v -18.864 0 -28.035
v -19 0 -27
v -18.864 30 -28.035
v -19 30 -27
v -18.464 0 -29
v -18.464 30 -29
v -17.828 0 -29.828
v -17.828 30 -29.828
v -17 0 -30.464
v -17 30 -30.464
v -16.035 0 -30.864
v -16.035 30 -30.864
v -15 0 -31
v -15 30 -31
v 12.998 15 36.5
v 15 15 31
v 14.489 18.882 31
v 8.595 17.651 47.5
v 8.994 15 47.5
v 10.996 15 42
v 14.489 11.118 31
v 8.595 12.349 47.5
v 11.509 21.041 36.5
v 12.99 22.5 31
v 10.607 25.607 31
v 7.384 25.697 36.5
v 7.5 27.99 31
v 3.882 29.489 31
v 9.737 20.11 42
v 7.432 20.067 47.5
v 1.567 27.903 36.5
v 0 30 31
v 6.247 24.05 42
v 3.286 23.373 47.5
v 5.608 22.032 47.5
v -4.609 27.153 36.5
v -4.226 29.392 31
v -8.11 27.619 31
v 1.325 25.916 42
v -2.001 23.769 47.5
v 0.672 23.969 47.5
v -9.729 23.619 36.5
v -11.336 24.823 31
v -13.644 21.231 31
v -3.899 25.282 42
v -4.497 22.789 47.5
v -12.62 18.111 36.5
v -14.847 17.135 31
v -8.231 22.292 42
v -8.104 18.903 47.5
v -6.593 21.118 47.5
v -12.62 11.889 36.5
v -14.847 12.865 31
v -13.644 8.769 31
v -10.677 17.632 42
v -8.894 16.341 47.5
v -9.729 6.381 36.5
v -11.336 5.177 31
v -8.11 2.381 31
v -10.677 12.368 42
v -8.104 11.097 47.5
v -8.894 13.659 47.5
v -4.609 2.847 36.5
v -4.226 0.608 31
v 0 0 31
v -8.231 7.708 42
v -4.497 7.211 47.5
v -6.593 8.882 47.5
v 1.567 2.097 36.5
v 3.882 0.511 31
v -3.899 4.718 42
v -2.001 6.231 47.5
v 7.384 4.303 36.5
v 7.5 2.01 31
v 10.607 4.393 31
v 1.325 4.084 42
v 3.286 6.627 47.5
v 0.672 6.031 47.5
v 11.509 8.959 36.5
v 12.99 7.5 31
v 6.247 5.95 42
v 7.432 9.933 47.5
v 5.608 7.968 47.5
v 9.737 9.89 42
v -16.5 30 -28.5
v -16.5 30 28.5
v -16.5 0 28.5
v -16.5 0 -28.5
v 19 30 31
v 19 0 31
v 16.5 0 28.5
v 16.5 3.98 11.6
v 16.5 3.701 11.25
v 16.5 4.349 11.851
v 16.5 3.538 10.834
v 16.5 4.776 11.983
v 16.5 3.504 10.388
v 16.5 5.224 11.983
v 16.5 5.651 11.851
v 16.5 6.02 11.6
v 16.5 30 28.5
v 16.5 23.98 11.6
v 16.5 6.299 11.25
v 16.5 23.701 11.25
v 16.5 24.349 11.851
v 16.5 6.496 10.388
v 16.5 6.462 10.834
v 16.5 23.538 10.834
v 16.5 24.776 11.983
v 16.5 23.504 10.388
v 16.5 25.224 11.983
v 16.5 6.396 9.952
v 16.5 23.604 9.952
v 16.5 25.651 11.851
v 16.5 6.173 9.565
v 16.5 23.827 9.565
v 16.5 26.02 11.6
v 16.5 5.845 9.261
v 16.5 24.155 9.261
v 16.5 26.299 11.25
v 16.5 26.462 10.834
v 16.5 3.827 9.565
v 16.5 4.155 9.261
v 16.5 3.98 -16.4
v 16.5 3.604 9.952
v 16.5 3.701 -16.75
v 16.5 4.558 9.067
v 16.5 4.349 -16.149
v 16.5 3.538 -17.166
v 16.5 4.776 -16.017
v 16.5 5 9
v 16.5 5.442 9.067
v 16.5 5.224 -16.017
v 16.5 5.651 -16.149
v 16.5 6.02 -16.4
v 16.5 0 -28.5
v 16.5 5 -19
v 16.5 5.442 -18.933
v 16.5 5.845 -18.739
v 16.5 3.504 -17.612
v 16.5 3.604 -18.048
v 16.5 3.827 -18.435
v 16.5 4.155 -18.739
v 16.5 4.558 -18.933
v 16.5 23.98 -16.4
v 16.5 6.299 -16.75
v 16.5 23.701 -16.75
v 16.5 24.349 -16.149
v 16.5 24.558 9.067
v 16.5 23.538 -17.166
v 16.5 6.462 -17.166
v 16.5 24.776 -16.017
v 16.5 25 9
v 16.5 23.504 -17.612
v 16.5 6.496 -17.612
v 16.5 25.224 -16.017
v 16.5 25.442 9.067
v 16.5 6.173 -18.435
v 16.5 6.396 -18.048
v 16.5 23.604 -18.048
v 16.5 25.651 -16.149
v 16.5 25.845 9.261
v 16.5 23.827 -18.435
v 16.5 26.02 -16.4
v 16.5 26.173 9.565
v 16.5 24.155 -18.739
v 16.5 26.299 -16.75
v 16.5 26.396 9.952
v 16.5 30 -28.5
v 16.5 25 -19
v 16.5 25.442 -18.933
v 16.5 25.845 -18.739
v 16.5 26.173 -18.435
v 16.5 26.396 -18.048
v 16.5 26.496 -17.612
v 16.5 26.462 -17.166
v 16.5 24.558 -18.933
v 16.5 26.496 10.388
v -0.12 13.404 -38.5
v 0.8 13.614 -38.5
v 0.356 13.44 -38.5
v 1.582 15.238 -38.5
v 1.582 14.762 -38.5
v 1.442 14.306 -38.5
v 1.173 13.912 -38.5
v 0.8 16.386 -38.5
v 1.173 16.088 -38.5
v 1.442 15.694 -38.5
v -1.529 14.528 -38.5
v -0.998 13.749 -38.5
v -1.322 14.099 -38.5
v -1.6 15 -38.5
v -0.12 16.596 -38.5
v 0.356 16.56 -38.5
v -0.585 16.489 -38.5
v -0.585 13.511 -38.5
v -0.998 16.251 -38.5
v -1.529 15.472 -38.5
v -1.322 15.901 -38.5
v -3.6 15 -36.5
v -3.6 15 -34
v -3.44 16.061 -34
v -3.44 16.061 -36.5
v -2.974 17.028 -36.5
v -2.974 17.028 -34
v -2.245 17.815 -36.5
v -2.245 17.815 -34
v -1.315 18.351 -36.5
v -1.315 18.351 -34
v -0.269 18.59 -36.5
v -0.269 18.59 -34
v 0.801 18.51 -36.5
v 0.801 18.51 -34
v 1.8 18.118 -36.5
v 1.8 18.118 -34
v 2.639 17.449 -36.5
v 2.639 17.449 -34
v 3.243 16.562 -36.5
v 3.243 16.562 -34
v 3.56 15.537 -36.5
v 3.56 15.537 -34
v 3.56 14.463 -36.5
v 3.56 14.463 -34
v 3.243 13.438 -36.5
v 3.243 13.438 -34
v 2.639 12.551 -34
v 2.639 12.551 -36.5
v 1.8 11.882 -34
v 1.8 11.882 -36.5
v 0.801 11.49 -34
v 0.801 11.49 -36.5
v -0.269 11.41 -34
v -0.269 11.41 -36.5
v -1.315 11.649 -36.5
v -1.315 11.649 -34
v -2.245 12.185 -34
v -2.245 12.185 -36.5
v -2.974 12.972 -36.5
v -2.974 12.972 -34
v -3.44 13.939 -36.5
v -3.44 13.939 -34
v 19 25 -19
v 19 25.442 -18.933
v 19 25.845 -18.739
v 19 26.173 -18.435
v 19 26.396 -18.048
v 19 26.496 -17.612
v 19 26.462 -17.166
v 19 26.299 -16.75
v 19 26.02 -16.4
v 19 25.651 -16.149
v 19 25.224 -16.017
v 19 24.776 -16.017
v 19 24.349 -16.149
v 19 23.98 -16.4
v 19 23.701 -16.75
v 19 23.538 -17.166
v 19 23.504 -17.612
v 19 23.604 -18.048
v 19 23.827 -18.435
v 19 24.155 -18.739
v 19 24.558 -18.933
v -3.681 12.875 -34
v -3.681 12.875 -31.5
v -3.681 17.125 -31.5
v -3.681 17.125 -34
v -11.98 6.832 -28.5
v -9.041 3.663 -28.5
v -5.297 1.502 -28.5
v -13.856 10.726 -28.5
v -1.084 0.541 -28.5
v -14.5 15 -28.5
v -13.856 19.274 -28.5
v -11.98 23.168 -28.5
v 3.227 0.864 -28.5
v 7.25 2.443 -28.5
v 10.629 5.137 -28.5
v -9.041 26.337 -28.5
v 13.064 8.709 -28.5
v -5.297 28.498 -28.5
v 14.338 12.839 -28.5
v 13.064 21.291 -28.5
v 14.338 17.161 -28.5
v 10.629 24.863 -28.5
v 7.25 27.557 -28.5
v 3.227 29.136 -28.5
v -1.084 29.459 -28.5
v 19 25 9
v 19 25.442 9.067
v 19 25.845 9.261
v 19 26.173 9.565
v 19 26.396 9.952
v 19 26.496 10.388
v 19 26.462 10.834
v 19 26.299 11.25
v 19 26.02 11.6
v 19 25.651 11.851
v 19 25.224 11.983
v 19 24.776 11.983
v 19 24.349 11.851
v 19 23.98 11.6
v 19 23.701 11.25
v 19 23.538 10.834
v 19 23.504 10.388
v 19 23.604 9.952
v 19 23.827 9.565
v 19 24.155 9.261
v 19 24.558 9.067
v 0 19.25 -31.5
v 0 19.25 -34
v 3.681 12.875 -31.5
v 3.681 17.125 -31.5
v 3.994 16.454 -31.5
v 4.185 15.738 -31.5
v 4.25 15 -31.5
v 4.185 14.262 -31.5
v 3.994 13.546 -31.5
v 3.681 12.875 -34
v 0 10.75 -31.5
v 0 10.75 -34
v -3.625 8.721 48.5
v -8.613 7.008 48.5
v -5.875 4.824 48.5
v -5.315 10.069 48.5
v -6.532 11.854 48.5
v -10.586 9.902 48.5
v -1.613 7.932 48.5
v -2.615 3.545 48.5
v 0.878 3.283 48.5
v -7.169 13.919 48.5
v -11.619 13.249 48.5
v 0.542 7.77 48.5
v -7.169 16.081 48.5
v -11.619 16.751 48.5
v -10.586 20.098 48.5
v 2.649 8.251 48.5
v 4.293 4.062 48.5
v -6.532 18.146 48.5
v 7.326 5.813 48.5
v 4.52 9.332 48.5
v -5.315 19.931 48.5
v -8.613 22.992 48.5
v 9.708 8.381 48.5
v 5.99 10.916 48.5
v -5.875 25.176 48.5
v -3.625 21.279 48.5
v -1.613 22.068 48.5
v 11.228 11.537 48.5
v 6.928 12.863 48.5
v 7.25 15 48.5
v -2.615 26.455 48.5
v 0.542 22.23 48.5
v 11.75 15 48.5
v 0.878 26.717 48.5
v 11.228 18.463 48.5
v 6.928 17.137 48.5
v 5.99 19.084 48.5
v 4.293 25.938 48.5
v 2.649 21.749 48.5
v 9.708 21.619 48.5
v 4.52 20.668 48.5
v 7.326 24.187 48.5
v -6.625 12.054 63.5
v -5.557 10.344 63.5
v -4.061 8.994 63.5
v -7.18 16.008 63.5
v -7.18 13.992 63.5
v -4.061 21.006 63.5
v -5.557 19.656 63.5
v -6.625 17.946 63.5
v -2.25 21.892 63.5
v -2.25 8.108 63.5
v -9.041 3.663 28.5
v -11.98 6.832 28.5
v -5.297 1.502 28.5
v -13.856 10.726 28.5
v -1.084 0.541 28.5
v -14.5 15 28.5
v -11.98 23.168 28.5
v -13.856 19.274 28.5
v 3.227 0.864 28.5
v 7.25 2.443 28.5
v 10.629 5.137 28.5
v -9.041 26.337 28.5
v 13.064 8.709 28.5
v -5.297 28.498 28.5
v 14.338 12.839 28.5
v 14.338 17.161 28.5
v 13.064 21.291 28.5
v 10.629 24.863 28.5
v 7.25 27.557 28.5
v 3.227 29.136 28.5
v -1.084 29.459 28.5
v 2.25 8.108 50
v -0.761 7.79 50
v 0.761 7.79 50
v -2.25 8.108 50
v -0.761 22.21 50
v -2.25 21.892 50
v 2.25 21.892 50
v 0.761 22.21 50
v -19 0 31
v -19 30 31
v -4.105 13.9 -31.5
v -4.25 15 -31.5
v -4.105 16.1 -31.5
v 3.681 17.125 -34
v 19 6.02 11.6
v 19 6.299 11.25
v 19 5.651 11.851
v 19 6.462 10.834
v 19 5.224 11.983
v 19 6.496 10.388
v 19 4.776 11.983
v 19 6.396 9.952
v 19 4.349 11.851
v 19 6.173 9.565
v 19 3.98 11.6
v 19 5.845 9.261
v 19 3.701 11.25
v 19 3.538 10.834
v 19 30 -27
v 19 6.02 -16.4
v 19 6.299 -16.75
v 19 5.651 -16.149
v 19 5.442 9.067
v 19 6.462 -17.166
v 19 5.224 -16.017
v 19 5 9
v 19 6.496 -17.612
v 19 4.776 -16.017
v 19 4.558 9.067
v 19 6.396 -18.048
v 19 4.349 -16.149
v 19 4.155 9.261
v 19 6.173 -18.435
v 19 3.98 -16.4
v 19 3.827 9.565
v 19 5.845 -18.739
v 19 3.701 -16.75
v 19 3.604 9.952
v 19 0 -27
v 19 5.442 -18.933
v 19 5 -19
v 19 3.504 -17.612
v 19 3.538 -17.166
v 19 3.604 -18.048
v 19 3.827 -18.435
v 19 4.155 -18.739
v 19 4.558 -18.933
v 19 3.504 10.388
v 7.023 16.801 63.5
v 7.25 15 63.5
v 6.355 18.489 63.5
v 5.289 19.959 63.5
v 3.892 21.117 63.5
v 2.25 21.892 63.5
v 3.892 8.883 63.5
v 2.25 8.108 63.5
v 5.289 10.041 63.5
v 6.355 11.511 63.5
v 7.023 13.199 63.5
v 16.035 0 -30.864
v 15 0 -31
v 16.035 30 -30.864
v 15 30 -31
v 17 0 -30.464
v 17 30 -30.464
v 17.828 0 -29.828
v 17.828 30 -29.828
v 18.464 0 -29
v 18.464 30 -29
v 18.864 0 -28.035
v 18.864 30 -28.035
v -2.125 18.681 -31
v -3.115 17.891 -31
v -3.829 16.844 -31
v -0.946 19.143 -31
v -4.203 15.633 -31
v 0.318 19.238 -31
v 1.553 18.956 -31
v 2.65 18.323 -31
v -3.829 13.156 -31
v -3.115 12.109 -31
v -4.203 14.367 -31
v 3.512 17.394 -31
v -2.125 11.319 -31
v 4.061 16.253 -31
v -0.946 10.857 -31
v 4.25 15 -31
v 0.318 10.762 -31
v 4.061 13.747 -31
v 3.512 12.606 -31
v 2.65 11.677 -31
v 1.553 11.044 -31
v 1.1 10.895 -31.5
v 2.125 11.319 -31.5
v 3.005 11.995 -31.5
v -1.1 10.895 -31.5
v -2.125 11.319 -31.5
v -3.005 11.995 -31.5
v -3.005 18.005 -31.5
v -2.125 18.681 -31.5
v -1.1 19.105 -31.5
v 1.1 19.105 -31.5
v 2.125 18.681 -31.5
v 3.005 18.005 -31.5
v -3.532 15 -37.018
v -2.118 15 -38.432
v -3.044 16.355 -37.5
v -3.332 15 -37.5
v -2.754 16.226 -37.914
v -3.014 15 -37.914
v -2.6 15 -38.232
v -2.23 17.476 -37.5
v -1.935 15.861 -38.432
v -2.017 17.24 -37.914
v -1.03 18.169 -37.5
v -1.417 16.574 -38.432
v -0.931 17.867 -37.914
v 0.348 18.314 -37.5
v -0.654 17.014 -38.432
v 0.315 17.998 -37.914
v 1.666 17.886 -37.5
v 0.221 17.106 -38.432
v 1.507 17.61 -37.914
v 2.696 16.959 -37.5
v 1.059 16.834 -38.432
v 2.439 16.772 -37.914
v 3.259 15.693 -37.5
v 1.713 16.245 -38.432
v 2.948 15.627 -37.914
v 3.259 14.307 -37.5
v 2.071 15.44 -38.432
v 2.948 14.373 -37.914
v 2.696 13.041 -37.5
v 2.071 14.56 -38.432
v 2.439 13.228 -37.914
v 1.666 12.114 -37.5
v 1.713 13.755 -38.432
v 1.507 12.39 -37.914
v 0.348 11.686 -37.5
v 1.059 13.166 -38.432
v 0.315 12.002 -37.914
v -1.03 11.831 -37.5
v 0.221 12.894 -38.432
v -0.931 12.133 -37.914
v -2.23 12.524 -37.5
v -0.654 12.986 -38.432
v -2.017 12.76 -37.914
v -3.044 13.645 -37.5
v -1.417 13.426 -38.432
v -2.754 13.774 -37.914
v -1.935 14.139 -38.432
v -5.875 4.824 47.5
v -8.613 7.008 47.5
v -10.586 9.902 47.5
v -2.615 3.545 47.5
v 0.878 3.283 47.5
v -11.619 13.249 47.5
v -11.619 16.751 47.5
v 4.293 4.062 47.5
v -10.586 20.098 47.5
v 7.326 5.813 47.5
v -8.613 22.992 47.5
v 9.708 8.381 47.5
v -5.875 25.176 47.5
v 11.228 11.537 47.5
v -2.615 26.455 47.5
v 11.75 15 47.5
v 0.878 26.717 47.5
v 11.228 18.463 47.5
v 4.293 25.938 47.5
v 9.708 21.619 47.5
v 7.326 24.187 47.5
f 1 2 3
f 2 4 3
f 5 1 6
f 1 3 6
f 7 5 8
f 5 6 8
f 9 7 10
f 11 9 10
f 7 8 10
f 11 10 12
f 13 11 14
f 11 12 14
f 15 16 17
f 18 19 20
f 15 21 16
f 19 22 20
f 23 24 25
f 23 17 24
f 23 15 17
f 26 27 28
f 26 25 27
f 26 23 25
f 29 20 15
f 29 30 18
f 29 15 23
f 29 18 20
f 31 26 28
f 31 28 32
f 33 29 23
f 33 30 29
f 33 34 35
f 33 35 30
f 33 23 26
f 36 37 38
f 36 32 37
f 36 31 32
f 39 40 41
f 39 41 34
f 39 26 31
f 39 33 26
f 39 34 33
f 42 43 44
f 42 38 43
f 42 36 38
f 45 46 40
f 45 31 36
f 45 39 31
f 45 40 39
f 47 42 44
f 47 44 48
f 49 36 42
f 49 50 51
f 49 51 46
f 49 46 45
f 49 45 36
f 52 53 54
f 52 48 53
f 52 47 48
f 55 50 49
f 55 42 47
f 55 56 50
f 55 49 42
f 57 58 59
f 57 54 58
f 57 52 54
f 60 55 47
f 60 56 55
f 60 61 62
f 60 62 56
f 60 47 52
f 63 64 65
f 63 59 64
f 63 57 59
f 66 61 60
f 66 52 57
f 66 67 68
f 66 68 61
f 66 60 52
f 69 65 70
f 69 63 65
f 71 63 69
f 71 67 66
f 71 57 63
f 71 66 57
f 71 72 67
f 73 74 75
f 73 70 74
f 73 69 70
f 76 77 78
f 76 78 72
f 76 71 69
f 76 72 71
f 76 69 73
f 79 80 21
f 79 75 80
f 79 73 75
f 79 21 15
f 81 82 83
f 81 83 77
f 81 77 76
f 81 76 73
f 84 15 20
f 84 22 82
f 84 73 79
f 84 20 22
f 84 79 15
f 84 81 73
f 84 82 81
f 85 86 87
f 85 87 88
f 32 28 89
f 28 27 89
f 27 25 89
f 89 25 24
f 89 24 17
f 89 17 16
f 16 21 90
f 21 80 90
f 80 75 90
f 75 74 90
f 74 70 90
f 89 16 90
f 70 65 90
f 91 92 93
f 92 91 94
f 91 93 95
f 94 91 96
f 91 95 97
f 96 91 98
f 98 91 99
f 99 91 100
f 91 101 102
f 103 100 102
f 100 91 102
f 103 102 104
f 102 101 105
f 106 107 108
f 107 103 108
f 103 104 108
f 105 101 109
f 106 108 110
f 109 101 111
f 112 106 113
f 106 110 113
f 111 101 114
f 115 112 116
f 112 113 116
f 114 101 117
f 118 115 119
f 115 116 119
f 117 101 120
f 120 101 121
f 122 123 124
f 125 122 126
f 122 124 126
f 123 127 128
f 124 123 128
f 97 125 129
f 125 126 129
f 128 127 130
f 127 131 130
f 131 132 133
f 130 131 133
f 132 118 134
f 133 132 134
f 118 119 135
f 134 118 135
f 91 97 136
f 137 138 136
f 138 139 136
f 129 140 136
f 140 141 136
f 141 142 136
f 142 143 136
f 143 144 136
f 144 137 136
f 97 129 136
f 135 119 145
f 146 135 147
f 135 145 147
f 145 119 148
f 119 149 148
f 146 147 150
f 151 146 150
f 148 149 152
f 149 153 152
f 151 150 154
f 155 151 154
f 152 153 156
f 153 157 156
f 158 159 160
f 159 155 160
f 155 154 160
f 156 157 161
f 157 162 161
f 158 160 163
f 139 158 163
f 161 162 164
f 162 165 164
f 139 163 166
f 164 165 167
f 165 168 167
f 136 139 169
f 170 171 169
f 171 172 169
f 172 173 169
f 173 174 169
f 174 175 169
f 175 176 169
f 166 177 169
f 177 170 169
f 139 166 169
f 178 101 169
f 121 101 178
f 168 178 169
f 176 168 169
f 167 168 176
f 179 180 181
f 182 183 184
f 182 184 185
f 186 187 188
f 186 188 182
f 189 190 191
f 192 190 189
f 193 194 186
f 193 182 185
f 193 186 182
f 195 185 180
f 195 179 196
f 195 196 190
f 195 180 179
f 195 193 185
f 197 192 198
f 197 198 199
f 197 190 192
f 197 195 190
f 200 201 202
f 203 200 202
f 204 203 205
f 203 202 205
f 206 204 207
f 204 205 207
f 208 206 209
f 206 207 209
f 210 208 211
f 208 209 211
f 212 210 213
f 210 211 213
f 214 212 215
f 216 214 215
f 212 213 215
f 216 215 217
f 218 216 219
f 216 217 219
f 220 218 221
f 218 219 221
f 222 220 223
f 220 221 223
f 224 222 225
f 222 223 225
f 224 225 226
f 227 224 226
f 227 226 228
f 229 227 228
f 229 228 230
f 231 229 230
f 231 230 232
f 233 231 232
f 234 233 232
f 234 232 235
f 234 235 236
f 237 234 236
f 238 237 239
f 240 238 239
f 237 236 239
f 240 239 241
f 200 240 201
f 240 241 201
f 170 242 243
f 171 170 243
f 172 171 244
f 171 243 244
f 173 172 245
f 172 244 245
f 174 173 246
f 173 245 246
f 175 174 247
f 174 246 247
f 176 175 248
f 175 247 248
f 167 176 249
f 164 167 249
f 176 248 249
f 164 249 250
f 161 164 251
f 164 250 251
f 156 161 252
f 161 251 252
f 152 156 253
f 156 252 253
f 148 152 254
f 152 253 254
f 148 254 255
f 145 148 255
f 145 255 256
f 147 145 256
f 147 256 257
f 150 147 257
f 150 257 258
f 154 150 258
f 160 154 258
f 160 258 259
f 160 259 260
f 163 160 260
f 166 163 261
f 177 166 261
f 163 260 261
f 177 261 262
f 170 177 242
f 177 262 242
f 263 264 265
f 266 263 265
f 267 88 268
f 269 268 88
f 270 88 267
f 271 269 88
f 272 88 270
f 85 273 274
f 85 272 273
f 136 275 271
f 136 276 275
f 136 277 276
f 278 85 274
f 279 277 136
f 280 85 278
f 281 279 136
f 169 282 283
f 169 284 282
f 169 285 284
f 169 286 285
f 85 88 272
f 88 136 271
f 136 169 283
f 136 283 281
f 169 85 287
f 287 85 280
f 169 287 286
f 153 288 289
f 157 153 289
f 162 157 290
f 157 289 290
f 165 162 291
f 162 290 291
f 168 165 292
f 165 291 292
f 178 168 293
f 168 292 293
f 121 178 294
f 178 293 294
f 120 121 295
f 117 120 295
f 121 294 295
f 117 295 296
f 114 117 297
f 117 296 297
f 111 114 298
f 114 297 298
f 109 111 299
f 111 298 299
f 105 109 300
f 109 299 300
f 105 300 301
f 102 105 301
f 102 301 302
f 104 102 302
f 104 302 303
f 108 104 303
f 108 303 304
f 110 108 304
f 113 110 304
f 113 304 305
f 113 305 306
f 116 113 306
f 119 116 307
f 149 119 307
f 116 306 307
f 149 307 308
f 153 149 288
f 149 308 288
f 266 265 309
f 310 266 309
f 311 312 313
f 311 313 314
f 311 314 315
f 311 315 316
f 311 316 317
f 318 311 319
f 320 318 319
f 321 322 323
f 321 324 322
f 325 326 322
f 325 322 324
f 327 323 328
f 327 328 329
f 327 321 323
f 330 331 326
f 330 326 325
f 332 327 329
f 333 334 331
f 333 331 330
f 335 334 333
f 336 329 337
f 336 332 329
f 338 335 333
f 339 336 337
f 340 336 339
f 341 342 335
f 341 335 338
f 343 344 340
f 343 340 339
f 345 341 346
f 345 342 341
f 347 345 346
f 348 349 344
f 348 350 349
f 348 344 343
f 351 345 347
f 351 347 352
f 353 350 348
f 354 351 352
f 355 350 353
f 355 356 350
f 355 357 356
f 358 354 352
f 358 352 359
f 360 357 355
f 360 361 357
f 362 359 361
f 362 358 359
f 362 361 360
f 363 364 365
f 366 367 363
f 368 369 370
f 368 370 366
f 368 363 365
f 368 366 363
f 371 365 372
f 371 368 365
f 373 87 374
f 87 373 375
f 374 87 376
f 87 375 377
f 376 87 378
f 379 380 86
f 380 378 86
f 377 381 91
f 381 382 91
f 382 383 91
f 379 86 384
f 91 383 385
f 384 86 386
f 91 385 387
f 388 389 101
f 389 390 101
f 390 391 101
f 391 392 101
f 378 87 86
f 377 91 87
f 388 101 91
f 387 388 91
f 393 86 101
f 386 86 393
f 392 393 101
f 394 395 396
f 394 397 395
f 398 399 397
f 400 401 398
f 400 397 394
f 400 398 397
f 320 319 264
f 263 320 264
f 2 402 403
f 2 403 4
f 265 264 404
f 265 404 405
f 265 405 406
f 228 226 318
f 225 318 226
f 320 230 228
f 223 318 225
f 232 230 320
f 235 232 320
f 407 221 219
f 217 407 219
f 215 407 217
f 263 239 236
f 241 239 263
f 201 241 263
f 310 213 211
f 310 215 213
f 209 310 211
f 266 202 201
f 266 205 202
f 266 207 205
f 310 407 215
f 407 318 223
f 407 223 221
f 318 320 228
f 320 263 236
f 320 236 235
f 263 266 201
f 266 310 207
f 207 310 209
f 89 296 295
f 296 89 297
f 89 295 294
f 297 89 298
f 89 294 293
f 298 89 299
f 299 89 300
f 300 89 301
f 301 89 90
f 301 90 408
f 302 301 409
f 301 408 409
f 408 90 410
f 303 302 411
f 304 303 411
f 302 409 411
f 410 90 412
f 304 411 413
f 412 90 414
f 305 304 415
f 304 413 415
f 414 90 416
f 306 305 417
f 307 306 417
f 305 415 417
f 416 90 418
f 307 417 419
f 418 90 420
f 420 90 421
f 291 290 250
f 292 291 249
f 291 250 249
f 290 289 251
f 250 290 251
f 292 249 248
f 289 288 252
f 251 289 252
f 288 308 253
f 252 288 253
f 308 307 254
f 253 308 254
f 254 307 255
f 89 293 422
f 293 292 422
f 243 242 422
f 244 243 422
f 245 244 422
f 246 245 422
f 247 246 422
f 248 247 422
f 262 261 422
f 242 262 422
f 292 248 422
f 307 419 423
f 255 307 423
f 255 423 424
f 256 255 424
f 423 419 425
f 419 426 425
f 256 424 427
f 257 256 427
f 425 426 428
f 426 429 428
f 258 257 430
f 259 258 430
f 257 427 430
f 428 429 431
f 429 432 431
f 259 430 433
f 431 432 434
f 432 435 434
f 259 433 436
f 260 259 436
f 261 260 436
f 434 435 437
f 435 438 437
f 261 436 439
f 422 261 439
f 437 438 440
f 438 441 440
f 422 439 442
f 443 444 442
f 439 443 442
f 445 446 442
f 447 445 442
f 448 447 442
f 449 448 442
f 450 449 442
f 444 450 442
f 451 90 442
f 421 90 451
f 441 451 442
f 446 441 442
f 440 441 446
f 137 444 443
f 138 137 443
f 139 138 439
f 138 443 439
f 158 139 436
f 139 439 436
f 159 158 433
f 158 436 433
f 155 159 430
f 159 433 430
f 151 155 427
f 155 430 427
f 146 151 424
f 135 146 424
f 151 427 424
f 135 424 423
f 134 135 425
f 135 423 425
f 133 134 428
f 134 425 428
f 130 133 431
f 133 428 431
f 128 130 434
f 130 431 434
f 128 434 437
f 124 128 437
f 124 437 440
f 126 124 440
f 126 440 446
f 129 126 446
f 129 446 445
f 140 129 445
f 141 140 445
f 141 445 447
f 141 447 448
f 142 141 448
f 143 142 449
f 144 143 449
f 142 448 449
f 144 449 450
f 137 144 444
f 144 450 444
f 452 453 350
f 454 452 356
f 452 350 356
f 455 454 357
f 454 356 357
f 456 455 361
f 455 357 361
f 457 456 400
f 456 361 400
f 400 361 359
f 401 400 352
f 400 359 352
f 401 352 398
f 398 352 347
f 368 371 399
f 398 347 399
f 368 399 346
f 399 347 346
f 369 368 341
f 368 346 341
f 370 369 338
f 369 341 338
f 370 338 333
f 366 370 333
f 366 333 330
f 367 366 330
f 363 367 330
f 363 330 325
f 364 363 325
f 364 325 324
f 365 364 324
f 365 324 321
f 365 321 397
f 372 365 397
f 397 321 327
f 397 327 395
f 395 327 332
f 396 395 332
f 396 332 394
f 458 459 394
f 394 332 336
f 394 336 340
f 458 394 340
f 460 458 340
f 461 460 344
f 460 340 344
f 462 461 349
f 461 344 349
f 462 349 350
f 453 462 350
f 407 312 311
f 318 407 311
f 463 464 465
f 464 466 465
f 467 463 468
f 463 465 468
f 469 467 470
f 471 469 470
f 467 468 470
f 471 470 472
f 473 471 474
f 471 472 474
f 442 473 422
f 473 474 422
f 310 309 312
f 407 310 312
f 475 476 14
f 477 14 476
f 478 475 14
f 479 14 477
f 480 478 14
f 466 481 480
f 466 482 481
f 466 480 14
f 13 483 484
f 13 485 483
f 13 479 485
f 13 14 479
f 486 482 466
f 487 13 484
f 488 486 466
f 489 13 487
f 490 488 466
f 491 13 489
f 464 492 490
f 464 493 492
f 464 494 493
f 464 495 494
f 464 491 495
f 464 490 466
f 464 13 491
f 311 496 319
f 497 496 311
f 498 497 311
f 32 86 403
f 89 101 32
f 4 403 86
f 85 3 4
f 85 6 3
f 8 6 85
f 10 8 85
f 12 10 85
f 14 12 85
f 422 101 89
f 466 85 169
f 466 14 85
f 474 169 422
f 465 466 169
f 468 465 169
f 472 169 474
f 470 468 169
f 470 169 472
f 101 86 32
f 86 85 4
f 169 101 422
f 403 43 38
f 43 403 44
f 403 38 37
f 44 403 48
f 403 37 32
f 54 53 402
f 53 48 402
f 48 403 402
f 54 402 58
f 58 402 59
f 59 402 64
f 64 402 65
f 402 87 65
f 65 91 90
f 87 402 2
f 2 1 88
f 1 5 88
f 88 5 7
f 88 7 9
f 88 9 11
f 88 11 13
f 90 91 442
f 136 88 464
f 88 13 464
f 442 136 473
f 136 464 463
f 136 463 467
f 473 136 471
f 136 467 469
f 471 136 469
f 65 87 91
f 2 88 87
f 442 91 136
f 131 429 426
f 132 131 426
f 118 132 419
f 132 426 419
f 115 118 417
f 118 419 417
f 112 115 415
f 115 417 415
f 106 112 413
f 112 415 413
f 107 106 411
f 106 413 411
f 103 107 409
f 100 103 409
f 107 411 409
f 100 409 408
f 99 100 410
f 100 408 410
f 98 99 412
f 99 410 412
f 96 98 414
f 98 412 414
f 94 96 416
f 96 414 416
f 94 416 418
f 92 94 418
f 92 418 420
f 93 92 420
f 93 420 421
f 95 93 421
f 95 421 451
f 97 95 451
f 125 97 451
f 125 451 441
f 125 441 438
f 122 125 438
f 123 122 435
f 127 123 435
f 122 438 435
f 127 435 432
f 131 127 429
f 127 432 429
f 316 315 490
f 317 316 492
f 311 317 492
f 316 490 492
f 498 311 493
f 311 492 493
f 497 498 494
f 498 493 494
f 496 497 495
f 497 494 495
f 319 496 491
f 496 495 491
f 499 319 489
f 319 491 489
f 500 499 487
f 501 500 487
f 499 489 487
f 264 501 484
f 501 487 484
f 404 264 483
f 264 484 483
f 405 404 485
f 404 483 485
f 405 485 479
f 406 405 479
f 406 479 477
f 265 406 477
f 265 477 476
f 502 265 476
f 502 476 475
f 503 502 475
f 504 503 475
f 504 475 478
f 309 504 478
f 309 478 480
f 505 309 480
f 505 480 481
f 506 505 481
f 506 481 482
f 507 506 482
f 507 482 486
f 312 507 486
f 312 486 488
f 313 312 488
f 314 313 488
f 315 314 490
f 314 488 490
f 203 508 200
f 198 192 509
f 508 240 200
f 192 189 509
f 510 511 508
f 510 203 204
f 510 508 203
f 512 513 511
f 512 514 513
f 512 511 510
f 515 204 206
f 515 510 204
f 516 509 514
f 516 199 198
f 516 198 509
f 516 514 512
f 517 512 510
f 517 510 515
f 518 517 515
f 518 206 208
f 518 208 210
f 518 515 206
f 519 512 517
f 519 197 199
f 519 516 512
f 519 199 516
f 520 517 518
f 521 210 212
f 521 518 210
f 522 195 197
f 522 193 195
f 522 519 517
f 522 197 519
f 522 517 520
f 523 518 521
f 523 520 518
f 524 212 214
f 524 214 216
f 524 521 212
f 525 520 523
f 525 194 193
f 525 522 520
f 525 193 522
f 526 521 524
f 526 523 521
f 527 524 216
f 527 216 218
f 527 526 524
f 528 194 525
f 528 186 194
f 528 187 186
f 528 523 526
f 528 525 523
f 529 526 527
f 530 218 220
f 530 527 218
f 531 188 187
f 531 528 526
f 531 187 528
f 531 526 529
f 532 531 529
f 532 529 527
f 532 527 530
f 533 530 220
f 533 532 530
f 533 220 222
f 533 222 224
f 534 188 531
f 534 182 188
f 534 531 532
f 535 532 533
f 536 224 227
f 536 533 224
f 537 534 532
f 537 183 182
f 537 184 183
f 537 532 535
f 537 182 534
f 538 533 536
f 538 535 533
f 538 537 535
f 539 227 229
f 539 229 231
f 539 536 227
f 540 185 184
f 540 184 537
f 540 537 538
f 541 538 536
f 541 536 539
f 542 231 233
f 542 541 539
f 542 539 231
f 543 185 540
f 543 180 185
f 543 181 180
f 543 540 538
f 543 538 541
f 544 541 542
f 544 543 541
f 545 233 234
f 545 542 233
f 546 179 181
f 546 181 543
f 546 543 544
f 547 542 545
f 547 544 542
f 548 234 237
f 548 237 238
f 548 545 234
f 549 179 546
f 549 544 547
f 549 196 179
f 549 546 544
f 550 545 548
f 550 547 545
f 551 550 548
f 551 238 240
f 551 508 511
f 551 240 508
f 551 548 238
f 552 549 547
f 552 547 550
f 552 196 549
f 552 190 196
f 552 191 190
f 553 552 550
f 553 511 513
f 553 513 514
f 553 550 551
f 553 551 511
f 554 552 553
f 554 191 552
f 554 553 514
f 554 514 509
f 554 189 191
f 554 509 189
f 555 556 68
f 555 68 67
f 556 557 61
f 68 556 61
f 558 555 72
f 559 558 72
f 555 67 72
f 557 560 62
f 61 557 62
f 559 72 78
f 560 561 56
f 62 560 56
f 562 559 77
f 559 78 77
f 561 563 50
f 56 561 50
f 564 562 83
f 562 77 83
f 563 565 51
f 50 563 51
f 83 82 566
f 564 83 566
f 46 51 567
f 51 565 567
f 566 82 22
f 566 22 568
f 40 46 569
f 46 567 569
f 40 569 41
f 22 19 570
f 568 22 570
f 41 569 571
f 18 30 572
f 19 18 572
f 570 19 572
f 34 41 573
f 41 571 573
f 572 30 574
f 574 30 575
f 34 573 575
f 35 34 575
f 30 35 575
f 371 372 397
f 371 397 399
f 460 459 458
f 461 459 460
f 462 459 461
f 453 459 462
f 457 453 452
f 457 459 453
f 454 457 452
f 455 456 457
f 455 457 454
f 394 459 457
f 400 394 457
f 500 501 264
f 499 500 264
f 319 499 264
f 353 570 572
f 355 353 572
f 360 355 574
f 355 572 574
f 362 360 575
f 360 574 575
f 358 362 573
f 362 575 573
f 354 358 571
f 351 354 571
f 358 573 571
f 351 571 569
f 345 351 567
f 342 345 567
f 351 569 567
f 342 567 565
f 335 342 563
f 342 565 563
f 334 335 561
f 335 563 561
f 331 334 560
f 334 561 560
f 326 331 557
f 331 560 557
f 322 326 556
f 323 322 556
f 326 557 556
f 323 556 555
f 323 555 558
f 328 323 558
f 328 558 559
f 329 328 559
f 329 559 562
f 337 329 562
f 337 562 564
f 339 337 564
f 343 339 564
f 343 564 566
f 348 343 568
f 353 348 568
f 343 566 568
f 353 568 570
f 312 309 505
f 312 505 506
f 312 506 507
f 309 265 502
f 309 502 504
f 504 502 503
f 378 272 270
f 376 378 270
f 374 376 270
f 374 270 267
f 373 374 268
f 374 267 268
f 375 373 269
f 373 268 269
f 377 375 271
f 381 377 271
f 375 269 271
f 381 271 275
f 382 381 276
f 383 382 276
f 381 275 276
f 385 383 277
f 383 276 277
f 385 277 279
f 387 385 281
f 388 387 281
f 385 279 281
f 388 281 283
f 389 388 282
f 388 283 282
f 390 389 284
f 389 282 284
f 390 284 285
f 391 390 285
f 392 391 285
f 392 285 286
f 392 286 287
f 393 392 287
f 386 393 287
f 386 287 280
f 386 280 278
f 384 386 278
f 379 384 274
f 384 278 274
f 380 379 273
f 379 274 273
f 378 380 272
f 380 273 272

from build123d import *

# Parameters (mm, degrees)
SKETCH1_W           = 38
SKETCH1_H           = 62
BOSS_EXTRUDE1_DEPTH = 30
SKETCH2_W           = 33
SKETCH2_H           = 57
CUT_EXTRUDE1_DEPTH  = 30
FILLET1_R           = 4
SKETCH3_R           = 1.5
CUT_EXTRUDE2_DEPTH  = 2.5
SKETCH4_R           = 14.5
BOSS_EXTRUDE2_DEPTH = 57
SKETCH5_R           = 4.25
BOSS_EXTRUDE3_DEPTH = 0.5
BOSS_EXTRUDE4_DEPTH = 2.5
SKETCH8_R           = 3.6
BOSS_EXTRUDE5_DEPTH = 4.5
FILLET2_R           = 2
SKETCH10_R          = 7.25
BOSS_EXTRUDE6_DEPTH = 16.5
SKETCH11_R          = 11.75
BOSS_EXTRUDE7_DEPTH = 1
SKETCH12_R          = 7.25
BOSS_EXTRUDE8_DEPTH = 15
SKETCH13_W          = 4.5
SKETCH13_H          = 14.5
CUT_EXTRUDE3_DEPTH  = 13.5
SKETCH15_R          = 15
BOSS_EXTRUDE9_DEPTH = 16.5
BOSS_EXTRUDE9_TAPER = 20


with BuildPart() as part:
    # Sketch1 → Boss-Extrude1 (new body)
    with BuildSketch(Plane(origin=(0, 0, 0), x_dir=(1, 0, 0), z_dir=(0, 1, 0))):
        Rectangle(SKETCH1_W, SKETCH1_H)
    extrude(amount=BOSS_EXTRUDE1_DEPTH)

    # Sketch2 → Cut-Extrude1 (cut)
    with BuildSketch(Plane(origin=(0, 30, 0), x_dir=(1, 0, 0), z_dir=(0, 1, 0))):
        Rectangle(SKETCH2_W, SKETCH2_H)
    extrude(amount=-CUT_EXTRUDE1_DEPTH, mode=Mode.SUBTRACT)

    # Fillet1
    fillet1_edges = [part.edges().sort_by_distance(p)[0] for p in [
        (-19, 15, -31),
        (19, 15, -31),
    ]]
    fillet(fillet1_edges, radius=FILLET1_R)

    # Sketch3 → Cut-Extrude2 (cut)
    with BuildSketch(Plane(origin=(19, 0, 0), x_dir=(0, 0, -1), z_dir=(1, 0, 0))):
        with Locations((17.5, 25)):
            Circle(SKETCH3_R)
        with Locations((17.5, 5)):
            Circle(SKETCH3_R)
        with Locations((-10.5, 25)):
            Circle(SKETCH3_R)
        with Locations((-10.5, 5)):
            Circle(SKETCH3_R)
    extrude(amount=-CUT_EXTRUDE2_DEPTH, mode=Mode.SUBTRACT)

    # Sketch4 → Boss-Extrude2 (add)
    with BuildSketch(Plane.XY.offset(-28.5)):
        with Locations(Location((0, 15, 0), (0, 0, 180))):
            Circle(SKETCH4_R)
    extrude(amount=BOSS_EXTRUDE2_DEPTH)

    # Sketch5 → Boss-Extrude3 (add)
    with BuildSketch(Plane(origin=(0, 0, -31), x_dir=(-1, 0, 0), z_dir=(0, 0, -1))):
        with Locations(Location((0, 15, 0), (0, 0, 180))):
            Circle(SKETCH5_R)
    extrude(amount=BOSS_EXTRUDE3_DEPTH)

    # Sketch6 → Boss-Extrude4 (add)
    with BuildSketch(Plane(origin=(0, 0, -31.5), x_dir=(-1, 0, 0), z_dir=(0, 0, -1))):
        Polygon((0, 19.25), (-3.680607966, 17.125), (-3.680607966, 12.875), (0, 10.75), (3.680607966, 12.875), (3.680607966, 17.125), align=None)
    extrude(amount=BOSS_EXTRUDE4_DEPTH)

    # Sketch8 → Boss-Extrude5 (add)
    with BuildSketch(Plane(origin=(0, 0, -34), x_dir=(-1, 0, 0), z_dir=(0, 0, -1))):
        with Locations((0, 15)):
            Circle(SKETCH8_R)
    extrude(amount=BOSS_EXTRUDE5_DEPTH)

    # Fillet2
    fillet2_edges = [part.edges().sort_by_distance(p)[0] for p in [
        (3.6, 15, -38.5),
    ]]
    fillet(fillet2_edges, radius=FILLET2_R)

    # Sketch10 → Boss-Extrude6 (add)
    with BuildSketch(Plane.XY.offset(31)):
        with Locations((0, 15)):
            Circle(SKETCH10_R)
    extrude(amount=BOSS_EXTRUDE6_DEPTH)

    # Sketch11 → Boss-Extrude7 (add)
    with BuildSketch(Plane.XY.offset(47.5)):
        with Locations((0, 15)):
            Circle(SKETCH11_R)
    extrude(amount=BOSS_EXTRUDE7_DEPTH)

    # Sketch12 → Boss-Extrude8 (add)
    with BuildSketch(Plane.XY.offset(48.5)):
        with Locations((0, 15)):
            Circle(SKETCH12_R)
    extrude(amount=BOSS_EXTRUDE8_DEPTH)

    # Sketch13 → Cut-Extrude3 (cut)
    with BuildSketch(Plane.XY.offset(63.5)):
        with Locations((0, 15)):
            Rectangle(SKETCH13_W, SKETCH13_H)
    extrude(amount=-CUT_EXTRUDE3_DEPTH, mode=Mode.SUBTRACT)

    # Sketch15 → Boss-Extrude9 (add)
    with BuildSketch(Plane.XY.offset(31)):
        with Locations((0, 15)):
            Circle(SKETCH15_R)
    extrude(amount=BOSS_EXTRUDE9_DEPTH, taper=BOSS_EXTRUDE9_TAPER)


solid = part.part
